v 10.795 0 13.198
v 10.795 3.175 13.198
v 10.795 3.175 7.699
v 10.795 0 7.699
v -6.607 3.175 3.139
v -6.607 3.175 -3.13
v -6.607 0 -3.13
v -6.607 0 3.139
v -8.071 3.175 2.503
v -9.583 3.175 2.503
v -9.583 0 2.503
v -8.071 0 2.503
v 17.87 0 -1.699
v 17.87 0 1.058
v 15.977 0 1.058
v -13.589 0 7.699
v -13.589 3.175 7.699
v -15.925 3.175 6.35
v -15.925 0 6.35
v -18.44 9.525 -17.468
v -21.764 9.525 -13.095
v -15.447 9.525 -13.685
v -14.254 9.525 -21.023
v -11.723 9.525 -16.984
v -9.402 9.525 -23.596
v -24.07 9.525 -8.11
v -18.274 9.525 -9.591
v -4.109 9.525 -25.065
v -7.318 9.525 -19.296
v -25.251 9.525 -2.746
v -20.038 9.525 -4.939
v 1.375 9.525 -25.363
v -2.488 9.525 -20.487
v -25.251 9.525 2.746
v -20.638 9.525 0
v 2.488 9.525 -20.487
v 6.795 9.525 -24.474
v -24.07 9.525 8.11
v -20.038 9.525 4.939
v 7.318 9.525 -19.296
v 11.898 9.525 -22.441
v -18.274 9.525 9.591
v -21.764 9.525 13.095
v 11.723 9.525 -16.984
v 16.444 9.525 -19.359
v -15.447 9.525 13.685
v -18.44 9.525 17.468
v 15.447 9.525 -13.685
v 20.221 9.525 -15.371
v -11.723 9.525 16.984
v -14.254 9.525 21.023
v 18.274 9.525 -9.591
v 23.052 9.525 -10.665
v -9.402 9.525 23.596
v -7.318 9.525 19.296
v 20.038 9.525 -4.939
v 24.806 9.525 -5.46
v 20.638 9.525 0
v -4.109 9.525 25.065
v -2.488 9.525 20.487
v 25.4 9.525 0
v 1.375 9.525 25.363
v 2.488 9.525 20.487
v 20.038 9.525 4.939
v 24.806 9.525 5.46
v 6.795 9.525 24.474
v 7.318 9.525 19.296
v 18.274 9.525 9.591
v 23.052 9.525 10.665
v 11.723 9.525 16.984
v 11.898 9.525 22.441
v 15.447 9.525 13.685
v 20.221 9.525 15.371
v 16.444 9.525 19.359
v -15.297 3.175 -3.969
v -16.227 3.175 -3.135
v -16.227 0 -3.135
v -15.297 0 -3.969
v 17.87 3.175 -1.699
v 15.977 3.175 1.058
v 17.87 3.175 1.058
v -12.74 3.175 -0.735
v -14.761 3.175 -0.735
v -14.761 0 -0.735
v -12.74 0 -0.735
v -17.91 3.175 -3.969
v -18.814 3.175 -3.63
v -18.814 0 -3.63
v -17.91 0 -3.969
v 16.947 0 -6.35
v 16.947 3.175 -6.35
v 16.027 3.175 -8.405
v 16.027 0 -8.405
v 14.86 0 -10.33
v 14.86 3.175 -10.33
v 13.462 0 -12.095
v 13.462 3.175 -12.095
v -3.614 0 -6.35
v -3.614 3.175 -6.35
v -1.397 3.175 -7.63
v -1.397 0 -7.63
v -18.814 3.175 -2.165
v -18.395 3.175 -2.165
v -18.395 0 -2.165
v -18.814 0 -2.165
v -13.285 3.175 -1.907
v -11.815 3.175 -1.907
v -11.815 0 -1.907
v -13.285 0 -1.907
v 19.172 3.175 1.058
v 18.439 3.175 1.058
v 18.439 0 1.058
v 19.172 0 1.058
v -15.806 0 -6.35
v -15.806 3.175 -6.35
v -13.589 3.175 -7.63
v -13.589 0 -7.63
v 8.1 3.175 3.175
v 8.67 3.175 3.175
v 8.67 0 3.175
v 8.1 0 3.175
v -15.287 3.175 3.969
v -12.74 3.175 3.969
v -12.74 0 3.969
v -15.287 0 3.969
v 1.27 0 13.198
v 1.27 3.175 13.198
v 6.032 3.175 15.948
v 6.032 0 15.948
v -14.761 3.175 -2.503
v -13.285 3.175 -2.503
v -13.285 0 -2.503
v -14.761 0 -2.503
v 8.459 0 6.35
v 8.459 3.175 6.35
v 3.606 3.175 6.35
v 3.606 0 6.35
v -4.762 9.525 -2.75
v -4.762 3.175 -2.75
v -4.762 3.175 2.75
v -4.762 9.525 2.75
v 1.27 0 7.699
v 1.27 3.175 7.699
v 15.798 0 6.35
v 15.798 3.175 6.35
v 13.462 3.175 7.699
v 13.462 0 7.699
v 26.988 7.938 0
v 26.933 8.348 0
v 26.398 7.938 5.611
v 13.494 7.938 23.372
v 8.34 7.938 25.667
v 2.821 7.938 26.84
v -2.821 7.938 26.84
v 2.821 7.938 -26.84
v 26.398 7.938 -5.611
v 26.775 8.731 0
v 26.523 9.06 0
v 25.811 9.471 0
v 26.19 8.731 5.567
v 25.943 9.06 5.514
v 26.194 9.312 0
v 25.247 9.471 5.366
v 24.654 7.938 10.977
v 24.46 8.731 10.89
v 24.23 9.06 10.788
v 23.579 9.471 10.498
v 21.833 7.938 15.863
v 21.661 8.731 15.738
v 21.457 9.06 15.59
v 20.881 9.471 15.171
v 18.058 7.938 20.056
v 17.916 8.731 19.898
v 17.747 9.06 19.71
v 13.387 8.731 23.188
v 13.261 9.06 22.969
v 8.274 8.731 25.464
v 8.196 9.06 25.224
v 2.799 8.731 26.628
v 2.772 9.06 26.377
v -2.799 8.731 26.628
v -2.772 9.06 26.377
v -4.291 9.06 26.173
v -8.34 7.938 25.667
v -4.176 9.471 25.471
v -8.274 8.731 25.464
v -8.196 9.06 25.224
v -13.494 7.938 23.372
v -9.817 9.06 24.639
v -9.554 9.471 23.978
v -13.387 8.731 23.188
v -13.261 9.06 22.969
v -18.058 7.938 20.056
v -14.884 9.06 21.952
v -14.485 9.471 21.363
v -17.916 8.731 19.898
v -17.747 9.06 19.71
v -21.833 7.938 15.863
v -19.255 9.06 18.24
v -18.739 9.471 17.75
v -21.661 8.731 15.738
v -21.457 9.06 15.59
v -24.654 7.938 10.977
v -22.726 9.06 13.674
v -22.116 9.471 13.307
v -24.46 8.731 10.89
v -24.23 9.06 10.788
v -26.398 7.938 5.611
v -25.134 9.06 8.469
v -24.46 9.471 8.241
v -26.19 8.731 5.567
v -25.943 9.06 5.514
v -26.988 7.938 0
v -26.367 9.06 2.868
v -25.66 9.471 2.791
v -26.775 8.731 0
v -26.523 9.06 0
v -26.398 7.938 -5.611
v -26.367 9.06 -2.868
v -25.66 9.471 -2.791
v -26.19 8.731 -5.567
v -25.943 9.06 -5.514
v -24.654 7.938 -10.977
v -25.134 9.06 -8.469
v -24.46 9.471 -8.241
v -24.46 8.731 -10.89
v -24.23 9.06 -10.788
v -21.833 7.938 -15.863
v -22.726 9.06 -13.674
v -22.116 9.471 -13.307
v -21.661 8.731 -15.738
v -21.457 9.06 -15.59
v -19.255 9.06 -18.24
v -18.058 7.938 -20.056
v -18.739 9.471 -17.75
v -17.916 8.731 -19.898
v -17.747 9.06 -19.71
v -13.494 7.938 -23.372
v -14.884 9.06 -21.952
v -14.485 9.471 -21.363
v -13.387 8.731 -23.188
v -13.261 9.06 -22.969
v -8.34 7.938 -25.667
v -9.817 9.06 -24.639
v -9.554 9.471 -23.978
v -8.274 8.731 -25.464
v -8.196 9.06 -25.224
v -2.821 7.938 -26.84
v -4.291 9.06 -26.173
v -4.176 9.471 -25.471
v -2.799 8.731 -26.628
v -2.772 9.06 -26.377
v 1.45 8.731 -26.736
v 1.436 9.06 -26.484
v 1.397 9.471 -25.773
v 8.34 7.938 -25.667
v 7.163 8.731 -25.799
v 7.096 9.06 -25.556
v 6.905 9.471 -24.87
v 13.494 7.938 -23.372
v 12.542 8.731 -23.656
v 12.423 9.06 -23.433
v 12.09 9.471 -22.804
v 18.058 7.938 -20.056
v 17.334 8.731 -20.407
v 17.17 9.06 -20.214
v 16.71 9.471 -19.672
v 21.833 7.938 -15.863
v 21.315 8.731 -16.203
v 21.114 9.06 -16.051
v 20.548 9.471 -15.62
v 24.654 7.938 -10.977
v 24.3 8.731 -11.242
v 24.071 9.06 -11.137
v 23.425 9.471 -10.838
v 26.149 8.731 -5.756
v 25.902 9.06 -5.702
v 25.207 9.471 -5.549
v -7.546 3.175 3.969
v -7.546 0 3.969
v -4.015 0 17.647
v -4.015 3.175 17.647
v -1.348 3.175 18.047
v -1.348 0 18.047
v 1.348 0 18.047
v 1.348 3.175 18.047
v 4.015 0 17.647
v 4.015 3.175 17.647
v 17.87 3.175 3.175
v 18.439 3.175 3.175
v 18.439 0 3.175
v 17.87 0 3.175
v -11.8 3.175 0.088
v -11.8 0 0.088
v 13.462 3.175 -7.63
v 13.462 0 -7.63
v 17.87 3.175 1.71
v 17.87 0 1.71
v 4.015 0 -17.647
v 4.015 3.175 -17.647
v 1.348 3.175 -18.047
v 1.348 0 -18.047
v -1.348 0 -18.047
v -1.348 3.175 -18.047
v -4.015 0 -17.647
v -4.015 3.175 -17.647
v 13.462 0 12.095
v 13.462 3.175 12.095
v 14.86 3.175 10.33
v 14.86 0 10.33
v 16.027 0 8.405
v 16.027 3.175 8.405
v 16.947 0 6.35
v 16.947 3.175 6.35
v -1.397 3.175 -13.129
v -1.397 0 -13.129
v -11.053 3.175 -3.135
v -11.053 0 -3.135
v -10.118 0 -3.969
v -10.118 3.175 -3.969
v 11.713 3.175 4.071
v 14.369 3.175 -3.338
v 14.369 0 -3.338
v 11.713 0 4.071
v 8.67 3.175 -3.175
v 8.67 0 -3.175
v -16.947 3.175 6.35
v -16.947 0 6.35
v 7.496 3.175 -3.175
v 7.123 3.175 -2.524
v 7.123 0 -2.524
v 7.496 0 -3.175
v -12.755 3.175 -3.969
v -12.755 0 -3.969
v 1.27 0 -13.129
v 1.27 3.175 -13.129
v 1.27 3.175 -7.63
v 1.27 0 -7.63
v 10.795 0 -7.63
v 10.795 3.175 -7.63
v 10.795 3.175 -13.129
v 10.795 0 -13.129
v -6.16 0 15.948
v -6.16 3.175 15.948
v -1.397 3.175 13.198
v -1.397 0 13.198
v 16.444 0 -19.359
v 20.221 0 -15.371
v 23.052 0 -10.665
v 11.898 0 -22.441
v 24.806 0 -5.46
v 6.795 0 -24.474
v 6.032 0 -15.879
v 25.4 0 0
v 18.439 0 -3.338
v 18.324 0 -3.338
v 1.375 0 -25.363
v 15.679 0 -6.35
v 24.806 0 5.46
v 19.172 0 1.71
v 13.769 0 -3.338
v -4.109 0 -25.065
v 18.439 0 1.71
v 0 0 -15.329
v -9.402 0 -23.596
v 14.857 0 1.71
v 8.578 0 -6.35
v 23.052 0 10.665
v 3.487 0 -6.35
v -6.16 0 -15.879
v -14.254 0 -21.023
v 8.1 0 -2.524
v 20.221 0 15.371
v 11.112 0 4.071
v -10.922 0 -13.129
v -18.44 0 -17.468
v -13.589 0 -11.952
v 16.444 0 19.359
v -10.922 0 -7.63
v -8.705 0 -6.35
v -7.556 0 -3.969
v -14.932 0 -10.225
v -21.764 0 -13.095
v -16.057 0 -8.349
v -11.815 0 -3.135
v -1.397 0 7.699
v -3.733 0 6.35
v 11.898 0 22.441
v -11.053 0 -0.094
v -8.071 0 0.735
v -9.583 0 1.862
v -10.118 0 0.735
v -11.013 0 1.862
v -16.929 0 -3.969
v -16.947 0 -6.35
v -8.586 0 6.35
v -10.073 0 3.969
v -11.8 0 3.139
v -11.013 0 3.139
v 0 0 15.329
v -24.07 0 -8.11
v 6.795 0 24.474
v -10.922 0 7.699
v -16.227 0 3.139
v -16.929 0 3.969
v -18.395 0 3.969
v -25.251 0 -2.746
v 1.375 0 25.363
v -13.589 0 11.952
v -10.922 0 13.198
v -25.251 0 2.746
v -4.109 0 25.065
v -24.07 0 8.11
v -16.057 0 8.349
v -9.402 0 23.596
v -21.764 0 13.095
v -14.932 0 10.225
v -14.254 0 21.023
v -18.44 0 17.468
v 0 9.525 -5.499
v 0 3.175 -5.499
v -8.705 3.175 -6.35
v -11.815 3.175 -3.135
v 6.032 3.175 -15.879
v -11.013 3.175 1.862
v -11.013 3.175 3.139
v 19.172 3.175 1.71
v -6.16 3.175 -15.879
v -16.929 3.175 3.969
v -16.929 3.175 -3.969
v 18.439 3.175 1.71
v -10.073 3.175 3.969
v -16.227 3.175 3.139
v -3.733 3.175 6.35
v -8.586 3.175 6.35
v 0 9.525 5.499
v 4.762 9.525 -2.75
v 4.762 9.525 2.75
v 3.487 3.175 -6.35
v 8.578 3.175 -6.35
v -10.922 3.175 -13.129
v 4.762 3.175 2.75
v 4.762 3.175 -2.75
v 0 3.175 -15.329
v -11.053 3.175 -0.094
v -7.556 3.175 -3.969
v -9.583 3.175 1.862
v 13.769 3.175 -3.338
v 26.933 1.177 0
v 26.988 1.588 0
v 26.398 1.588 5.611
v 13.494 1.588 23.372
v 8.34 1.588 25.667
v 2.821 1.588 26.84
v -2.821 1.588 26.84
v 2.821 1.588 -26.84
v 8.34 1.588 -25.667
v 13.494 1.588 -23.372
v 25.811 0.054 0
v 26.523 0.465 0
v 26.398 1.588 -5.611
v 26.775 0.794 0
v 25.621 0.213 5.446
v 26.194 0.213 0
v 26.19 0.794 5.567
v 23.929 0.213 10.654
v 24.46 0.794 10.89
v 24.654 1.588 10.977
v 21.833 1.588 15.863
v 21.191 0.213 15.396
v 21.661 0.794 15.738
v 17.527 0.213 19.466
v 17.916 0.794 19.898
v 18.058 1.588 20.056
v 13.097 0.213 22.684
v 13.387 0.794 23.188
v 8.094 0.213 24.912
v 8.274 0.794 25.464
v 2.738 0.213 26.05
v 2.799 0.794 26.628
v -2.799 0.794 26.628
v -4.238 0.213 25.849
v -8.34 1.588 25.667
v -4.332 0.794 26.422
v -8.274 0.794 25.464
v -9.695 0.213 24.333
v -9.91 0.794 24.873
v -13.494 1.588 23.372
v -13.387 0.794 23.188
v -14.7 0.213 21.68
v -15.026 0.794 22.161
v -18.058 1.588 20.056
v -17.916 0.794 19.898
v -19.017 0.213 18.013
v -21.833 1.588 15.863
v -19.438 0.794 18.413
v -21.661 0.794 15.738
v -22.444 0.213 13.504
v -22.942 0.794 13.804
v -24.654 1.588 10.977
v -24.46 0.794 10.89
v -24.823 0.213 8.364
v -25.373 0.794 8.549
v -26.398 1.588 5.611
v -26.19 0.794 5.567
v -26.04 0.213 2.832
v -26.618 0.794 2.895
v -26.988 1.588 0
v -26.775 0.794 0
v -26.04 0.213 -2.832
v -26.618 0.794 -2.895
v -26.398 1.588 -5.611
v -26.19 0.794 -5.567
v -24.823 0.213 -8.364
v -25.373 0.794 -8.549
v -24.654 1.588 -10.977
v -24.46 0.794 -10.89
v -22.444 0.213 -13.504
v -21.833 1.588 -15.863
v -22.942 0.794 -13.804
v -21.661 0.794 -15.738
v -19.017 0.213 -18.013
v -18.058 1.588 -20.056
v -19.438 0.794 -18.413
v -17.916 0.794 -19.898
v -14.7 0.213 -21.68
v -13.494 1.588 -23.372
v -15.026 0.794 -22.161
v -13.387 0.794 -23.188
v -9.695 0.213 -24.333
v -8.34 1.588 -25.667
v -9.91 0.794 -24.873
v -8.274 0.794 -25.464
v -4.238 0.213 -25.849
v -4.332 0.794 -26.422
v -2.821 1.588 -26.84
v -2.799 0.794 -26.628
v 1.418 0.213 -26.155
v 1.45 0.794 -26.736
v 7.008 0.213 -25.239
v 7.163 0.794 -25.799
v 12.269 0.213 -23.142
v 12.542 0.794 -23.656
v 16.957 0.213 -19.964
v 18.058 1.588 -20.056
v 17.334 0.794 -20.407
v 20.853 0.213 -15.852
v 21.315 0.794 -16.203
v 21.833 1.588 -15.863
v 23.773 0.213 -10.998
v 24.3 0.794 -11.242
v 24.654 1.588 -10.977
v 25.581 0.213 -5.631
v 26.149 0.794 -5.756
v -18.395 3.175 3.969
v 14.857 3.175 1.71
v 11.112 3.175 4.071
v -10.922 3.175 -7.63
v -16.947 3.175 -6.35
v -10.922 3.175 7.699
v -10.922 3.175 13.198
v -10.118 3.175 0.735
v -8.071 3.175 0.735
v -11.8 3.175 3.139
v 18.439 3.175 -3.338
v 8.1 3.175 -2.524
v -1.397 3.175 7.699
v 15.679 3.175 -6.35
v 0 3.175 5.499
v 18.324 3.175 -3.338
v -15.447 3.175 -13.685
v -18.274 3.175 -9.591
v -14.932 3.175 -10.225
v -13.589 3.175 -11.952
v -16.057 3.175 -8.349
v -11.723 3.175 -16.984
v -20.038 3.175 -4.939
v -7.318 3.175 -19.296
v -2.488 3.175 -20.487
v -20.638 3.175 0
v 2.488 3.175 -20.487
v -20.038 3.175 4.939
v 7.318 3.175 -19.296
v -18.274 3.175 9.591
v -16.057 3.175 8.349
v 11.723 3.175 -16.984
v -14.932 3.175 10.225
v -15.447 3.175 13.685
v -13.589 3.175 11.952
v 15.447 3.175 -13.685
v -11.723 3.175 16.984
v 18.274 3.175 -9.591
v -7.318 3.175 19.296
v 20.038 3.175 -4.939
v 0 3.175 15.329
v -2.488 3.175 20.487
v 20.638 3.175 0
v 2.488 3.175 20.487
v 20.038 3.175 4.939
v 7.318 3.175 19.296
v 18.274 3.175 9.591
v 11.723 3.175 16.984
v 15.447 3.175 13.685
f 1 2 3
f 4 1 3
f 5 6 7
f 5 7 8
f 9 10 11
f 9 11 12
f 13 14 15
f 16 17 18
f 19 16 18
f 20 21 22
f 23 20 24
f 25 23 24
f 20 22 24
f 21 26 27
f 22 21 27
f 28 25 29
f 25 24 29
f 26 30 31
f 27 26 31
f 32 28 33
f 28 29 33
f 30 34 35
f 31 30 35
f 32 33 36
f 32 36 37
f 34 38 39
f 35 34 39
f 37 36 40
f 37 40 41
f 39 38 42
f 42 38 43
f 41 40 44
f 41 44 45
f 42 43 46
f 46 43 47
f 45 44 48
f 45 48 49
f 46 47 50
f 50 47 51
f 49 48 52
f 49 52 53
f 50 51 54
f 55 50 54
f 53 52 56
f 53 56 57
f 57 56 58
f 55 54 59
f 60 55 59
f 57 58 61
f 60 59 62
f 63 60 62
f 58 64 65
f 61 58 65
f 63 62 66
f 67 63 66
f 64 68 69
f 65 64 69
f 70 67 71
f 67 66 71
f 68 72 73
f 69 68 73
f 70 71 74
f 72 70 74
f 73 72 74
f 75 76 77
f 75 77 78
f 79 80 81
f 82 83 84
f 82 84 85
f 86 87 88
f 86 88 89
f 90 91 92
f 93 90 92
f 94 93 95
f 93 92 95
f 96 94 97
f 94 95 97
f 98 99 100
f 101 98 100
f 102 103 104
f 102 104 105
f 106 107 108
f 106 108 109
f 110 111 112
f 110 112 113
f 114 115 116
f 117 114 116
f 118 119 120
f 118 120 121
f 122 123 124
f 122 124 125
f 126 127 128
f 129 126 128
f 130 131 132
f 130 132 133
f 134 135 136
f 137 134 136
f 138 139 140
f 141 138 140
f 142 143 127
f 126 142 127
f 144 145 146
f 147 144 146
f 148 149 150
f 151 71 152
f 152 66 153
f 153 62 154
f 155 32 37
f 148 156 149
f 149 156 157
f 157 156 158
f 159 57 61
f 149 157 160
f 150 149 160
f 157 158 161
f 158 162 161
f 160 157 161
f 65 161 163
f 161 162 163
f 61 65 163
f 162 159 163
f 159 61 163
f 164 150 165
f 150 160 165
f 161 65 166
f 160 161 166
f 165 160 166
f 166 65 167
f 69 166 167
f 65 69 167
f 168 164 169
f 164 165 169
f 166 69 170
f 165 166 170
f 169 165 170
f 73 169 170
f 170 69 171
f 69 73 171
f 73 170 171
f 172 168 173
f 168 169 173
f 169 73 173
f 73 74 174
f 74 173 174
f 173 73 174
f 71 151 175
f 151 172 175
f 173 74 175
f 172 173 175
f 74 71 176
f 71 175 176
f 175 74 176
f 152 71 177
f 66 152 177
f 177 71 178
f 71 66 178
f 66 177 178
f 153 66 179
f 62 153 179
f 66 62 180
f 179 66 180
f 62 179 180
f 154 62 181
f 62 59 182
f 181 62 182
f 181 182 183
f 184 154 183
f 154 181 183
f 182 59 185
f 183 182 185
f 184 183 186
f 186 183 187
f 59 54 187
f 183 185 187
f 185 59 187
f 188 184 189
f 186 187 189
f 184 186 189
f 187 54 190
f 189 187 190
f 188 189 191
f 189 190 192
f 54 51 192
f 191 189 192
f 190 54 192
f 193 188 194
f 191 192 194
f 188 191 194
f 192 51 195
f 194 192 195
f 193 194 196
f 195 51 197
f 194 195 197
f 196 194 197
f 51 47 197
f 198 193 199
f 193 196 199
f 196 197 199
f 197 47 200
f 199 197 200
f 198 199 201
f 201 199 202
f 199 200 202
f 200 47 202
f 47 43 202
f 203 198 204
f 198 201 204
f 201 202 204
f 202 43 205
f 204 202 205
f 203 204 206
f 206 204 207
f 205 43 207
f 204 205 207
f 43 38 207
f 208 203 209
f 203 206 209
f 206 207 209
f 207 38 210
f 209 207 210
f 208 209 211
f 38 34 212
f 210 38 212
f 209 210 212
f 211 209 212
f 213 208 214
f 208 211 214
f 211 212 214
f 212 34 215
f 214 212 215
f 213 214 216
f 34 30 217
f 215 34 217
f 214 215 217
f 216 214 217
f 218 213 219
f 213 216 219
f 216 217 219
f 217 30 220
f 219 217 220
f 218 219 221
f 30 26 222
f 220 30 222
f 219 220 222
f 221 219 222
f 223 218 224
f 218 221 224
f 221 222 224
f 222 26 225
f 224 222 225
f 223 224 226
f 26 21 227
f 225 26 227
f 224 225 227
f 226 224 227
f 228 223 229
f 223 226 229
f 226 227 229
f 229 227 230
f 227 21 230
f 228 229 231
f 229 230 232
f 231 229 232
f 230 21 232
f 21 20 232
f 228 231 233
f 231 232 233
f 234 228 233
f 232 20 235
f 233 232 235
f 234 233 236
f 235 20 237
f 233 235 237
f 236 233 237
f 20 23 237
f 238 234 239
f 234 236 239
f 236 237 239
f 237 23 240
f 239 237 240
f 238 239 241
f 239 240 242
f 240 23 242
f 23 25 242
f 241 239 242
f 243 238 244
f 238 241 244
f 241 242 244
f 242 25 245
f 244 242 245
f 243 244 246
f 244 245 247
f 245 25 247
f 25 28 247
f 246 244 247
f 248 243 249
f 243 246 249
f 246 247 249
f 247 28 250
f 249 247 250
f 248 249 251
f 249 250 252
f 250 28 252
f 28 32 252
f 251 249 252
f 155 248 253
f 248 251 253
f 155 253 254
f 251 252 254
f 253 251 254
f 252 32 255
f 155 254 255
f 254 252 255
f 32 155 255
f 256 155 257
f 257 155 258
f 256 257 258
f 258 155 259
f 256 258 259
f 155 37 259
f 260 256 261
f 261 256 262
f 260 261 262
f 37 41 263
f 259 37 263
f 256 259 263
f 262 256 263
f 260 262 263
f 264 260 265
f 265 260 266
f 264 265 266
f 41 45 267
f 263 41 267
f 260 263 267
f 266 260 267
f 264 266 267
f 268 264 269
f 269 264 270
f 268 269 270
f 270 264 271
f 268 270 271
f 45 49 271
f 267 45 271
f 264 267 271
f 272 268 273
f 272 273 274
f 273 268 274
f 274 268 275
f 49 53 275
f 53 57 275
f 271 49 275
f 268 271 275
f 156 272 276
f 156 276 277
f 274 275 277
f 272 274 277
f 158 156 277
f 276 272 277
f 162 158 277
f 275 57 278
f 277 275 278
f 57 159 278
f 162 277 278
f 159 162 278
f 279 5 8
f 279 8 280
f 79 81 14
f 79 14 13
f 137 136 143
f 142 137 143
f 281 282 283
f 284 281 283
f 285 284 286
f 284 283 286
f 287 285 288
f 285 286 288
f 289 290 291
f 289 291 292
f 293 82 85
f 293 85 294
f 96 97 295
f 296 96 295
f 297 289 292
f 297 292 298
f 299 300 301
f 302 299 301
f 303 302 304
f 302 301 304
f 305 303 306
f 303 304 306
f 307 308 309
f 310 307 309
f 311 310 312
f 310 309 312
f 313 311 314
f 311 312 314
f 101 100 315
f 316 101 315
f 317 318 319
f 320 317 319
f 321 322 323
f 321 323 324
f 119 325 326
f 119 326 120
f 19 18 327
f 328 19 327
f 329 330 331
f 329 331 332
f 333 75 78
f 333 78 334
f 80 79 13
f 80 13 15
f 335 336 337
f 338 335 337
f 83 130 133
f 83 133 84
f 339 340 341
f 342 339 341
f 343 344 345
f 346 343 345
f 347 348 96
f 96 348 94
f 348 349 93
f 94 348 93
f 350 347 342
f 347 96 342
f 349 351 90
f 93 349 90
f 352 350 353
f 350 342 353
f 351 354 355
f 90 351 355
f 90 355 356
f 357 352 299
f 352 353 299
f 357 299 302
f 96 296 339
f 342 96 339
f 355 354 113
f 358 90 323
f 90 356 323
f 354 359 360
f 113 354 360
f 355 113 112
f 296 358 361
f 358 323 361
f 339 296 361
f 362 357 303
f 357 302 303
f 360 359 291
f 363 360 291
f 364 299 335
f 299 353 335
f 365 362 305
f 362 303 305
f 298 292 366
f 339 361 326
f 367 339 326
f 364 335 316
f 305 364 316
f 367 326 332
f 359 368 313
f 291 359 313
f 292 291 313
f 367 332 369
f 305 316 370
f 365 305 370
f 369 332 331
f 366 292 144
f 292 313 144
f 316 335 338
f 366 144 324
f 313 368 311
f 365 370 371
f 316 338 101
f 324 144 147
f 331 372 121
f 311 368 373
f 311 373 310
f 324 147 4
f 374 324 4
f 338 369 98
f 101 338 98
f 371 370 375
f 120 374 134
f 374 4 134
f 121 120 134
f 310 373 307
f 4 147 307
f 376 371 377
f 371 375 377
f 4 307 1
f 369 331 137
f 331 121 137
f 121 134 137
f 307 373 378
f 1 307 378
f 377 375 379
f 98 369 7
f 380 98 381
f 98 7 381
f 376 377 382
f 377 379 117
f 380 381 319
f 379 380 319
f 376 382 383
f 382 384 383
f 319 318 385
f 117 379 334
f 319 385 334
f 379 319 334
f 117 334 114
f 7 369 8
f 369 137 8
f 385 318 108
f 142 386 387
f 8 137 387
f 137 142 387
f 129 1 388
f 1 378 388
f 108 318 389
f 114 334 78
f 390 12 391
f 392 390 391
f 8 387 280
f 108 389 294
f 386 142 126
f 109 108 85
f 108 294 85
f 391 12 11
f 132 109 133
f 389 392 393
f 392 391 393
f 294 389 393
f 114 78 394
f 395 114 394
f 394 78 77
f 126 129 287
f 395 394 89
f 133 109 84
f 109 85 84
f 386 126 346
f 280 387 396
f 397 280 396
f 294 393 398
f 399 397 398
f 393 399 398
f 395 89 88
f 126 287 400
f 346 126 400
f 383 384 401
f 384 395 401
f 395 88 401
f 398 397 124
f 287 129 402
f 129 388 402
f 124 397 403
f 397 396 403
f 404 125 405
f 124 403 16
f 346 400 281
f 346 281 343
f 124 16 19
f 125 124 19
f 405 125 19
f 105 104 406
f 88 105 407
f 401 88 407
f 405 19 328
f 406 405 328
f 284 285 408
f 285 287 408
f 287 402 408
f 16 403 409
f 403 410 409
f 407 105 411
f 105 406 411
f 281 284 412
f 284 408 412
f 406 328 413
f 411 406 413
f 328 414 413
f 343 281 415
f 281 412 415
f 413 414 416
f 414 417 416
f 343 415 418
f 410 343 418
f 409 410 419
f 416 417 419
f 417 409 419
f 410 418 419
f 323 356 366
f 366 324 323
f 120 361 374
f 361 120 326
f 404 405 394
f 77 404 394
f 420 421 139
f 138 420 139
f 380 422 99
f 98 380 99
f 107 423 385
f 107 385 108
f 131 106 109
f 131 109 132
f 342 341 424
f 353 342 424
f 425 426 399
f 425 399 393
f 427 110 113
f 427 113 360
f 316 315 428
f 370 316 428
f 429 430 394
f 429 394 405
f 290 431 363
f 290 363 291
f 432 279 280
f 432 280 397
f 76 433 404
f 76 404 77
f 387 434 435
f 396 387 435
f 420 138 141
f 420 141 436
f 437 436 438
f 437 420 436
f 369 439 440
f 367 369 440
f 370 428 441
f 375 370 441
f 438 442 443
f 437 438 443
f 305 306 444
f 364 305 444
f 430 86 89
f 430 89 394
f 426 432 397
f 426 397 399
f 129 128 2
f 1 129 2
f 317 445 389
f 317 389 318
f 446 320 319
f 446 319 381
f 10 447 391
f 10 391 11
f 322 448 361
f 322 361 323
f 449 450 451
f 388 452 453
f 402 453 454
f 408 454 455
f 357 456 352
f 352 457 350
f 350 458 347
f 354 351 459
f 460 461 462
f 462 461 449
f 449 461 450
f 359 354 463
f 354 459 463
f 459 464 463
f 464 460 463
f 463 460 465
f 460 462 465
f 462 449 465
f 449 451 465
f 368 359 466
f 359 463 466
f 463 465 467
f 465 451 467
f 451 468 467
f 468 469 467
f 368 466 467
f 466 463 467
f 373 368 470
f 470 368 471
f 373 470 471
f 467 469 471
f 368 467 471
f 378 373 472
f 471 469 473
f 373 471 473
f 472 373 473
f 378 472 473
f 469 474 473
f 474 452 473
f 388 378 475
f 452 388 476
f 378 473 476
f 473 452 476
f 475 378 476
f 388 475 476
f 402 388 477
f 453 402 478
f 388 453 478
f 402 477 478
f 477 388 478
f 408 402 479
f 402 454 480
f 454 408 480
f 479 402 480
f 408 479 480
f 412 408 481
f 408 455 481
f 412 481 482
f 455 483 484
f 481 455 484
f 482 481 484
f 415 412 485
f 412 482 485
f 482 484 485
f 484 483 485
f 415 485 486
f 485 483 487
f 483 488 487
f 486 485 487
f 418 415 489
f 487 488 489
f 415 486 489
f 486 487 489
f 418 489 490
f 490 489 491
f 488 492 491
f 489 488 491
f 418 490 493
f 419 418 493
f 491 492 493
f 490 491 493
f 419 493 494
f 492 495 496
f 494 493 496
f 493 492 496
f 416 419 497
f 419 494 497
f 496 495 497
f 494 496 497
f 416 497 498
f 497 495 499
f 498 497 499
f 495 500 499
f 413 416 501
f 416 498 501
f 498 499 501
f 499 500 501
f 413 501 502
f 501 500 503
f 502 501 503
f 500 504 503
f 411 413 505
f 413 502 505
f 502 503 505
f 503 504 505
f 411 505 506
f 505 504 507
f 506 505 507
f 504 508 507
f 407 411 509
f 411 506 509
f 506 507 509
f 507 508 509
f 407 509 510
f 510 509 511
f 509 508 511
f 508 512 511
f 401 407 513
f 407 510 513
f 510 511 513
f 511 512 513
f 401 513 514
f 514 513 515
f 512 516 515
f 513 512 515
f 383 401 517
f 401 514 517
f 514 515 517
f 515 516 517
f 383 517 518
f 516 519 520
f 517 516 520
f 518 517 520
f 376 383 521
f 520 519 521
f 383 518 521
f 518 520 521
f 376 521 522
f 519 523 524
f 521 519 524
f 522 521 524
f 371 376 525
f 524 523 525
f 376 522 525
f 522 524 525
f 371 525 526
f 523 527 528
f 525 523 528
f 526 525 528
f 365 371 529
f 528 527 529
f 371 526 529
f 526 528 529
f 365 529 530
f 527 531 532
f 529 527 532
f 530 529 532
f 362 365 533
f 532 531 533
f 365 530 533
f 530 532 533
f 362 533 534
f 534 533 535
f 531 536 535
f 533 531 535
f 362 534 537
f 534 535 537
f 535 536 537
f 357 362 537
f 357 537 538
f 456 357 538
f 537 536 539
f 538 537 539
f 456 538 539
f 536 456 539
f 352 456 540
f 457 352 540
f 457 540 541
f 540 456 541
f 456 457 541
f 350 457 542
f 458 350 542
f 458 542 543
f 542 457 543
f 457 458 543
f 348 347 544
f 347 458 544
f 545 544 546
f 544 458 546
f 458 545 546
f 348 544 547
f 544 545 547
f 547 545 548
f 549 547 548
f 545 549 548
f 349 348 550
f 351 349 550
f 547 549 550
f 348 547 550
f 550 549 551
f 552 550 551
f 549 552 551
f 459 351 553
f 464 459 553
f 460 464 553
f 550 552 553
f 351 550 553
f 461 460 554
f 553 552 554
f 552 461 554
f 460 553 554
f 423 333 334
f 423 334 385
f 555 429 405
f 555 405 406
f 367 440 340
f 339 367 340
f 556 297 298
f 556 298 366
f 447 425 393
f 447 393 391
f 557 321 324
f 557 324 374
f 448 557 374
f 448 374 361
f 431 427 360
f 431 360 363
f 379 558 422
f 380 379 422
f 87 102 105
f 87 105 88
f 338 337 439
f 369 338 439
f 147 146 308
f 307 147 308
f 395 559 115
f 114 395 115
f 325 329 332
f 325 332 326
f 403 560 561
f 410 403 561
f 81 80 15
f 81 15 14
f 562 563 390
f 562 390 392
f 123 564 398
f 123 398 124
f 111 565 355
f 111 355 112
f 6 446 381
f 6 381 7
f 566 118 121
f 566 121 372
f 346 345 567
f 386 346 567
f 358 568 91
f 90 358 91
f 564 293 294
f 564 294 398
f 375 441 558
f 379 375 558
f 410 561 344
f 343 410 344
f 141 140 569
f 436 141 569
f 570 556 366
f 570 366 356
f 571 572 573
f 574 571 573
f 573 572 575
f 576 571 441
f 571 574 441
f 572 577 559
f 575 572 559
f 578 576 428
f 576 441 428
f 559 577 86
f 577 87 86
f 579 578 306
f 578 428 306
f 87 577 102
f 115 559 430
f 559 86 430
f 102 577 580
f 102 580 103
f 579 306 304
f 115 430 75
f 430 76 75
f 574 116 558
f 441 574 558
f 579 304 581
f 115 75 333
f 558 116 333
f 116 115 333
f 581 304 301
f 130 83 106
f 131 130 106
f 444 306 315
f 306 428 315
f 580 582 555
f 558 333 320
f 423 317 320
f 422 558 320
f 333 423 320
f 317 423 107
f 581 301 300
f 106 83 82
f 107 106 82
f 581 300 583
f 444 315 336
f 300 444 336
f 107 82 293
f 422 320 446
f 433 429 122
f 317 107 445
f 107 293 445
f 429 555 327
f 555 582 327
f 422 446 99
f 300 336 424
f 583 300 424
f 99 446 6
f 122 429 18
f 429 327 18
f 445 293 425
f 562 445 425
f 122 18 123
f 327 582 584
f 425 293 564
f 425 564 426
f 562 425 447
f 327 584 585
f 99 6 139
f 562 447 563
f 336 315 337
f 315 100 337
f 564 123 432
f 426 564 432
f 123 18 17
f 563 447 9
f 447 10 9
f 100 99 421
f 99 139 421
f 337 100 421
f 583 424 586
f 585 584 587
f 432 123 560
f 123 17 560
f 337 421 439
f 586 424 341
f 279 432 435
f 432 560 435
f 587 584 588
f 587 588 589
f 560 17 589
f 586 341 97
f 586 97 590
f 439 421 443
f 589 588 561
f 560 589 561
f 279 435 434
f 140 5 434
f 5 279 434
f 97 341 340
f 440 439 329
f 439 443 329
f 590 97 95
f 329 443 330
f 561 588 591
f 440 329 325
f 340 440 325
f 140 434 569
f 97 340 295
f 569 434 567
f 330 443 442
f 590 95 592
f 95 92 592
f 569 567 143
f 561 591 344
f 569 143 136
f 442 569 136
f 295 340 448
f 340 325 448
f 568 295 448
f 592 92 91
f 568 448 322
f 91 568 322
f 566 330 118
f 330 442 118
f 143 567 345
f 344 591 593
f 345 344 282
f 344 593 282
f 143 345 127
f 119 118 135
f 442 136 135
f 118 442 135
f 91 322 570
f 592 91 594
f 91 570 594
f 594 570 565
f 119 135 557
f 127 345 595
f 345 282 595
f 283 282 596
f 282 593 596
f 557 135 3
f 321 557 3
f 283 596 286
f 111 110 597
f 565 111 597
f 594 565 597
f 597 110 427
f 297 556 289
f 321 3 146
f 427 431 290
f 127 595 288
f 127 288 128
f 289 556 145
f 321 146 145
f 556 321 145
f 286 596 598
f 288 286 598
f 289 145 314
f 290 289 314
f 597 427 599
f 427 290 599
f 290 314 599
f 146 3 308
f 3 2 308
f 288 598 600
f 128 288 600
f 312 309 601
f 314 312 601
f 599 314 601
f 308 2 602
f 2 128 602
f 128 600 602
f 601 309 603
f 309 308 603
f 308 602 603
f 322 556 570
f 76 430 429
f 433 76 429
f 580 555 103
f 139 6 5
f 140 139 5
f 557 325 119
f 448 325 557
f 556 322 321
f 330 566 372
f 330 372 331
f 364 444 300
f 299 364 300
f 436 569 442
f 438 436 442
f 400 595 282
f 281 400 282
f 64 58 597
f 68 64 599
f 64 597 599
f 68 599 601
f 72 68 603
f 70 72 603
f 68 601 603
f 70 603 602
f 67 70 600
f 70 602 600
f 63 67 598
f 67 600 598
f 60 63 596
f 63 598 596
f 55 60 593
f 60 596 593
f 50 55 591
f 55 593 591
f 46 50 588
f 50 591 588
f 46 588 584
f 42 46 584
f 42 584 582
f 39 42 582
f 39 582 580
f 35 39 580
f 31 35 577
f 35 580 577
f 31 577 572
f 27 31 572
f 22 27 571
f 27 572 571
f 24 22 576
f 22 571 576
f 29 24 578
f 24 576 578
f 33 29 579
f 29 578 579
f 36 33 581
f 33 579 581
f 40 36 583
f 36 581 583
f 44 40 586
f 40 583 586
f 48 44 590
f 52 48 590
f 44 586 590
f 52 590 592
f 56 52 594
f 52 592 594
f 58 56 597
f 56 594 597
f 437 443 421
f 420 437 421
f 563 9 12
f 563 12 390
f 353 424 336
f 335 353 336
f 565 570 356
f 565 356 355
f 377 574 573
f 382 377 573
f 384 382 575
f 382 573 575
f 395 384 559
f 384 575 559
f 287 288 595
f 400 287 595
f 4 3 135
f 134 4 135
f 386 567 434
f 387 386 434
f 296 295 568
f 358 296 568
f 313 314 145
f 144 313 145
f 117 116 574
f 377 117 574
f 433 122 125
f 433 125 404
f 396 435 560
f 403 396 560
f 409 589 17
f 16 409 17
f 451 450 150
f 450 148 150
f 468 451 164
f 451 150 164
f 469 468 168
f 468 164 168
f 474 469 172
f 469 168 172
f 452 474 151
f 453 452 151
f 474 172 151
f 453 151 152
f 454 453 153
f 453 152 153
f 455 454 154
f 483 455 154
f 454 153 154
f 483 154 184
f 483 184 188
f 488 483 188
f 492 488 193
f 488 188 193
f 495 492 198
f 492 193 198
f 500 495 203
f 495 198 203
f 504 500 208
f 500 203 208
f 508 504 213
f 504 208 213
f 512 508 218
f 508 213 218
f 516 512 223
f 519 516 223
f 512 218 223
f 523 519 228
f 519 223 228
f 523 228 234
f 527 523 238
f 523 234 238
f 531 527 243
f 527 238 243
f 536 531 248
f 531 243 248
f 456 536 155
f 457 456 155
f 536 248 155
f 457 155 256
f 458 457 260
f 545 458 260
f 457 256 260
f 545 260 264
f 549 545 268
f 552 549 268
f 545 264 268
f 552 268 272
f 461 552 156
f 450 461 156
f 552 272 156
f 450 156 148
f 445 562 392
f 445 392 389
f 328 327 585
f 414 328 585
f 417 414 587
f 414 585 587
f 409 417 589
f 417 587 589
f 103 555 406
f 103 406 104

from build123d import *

# Parameters (mm, degrees)
BOSS_EXTRUDE1_DEPTH     = 6.35
CUT_EXTRUDE1_DEPTH      = 7.35
CUT_EXTRUDE1_DEPTH_BACK = 4.175
CUT_EXTRUDE2_DEPTH      = 7.35
CUT_EXTRUDE2_DEPTH_BACK = 4.175


with BuildPart() as part:
    # Sketch1 → Revolve1 (revolve)
    with BuildSketch(Plane.XY):
        with BuildLine():
            Line((0, 0), (25.4, 0))
            ThreePointArc((25.4, 0), (26.522532015, 0.464967985), (26.9875, 1.5875))
            Line((26.9875, 1.5875), (26.9875, 7.9375))
            ThreePointArc((26.9875, 7.9375), (26.522532015, 9.060032015), (25.4, 9.525))
            Line((25.4, 9.525), (20.6375, 9.525))
            Line((20.6375, 9.525), (20.6375, 3.175))
            Line((20.6375, 3.175), (0, 3.175))
            Line((0, 3.175), (0, 0))
        make_face()
    revolve(axis=Axis((0, 3.175, 0), (0, -1, 0)))

    # Sketch2 → Boss-Extrude1 (add)
    with BuildSketch(Plane(origin=(0, 3.175, 0), x_dir=(1, 0, 0), z_dir=(0, 1, 0))):
        Polygon((0, 5.499261314), (-4.7625, 2.749630657), (-4.7625, -2.749630657), (0, -5.499261314), (4.7625, -2.749630657), (4.7625, 2.749630657), align=None)
    extrude(amount=BOSS_EXTRUDE1_DEPTH)

    # Sketch3 → Cut-Extrude1 (cut, two sides)
    with BuildSketch(Plane(origin=(0, 3.175, 0), x_dir=(1, 0, 0), z_dir=(0, 1, 0))) as cut_extrude1_sk:
        Polygon((-6.60689834, -3.139369578), (-7.545565353, -3.96875), (-10.072630611, -3.96875), (-11.0127947, -3.139369578), (-11.0127947, -1.862363259), (-9.583086571, -1.862363259), (-9.583086571, -2.503112033), (-8.07103923, -2.503112033), (-8.07103923, -0.735064598), (-10.117542908, -0.735064598), (-11.053215768, 0.094315824), (-11.053215768, 3.134878348), (-10.117542908, 3.96875), (-7.556044889, 3.96875), (-6.60689834, 3.130387118), align=None)
        Polygon((-11.800256978, -3.139369578), (-12.740421068, -3.96875), (-15.286948321, -3.96875), (-16.22711241, -3.139369578), (-16.22711241, 3.134878348), (-15.297427857, 3.96875), (-12.755391833, 3.96875), (-11.815227744, 3.134878348), (-11.815227744, 1.907275556), (-13.285356941, 1.907275556), (-13.285356941, 2.503112033), (-14.761474444, 2.503112033), (-14.761474444, 0.735064598), (-12.740421068, 0.735064598), (-11.800256978, -0.088327518), align=None)
        Polygon((-16.929241324, -3.96875), (-18.394879291, -3.96875), (-18.394879291, 2.164772727), (-18.814060732, 2.164772727), (-18.814060732, 3.630410694), (-17.909826481, 3.96875), (-16.929241324, 3.96875), align=None)
        Polygon((7.496103766, 3.175), (8.670192308, 3.175), (8.670192308, -3.175), (8.100320513, -3.175), (8.100320513, 2.523717949), (7.123397436, 2.523717949), align=None)
        Polygon((14.368910256, 3.337820513), (11.712900641, -4.070512821), (11.1125, -4.070512821), (13.768509615, 3.337820513), align=None)
        Polygon((18.323667869, 3.337820513), (18.439423077, 3.337820513), (18.439423077, -1.058333333), (19.172115385, -1.058333333), (19.172115385, -1.709615385), (18.439423077, -1.709615385), (18.439423077, -3.175), (17.869551282, -3.175), (17.869551282, -1.709615385), (14.857371795, -1.709615385), align=None)
        Polygon((17.869551282, -1.058333333), (17.869551282, 1.699439103), (15.976762821, -1.058333333), align=None, mode=Mode.SUBTRACT)
    extrude(amount=CUT_EXTRUDE1_DEPTH, mode=Mode.SUBTRACT)
    extrude(cut_extrude1_sk.sketch, amount=-CUT_EXTRUDE1_DEPTH_BACK, mode=Mode.SUBTRACT)

    # Sketch4 → Cut-Extrude2 (cut, two sides)
    with BuildSketch(Plane(origin=(0, 3.175, 0), x_dir=(1, 0, 0), z_dir=(0, 1, 0))) as cut_extrude2_sk:
        with BuildLine():
            Line((-16.946887804, 6.35), (-15.805631592, 6.35))
            Line((-15.805631592, 6.35), (-13.589, 7.629772846))
            Line((-13.589, 7.629772846), (-13.589, 11.952346433))
            ThreePointArc((-13.589, 11.952346433), (-15.522779467, 9.303914438), (-16.946887804, 6.35))
        make_face()
        Polygon((-8.705368408, 6.35), (-3.613631592, 6.35), (-1.397, 7.629772846), (-1.397, 13.12903416), (-6.1595, 15.878664817), (-10.922, 13.12903416), (-10.922, 7.629772846), align=None)
        with BuildLine():
            ThreePointArc((4.014638475, 17.64659129), (0, 18.0975), (-4.014638475, 17.64659129))
            Line((-4.014638475, 17.64659129), (0, 15.328738686))
            Line((0, 15.328738686), (4.014638475, 17.64659129))
        make_face()
        Polygon((1.27, 7.629772846), (3.486631592, 6.35), (8.578368408, 6.35), (10.795, 7.629772846), (10.795, 13.12903416), (6.0325, 15.878664817), (1.27, 13.12903416), align=None)
        with BuildLine():
            Line((13.462, 7.629772846), (15.678631592, 6.35))
            Line((15.678631592, 6.35), (16.946887804, 6.35))
            ThreePointArc((16.946887804, 6.35), (15.473427829, 9.385762487), (13.462, 12.095208235))
            Line((13.462, 12.095208235), (13.462, 7.629772846))
        make_face()
        Polygon((8.458522628, -6.35), (3.606477372, -6.35), (1.27, -7.69896584), (1.27, -13.198227154), (6.0325, -15.947857811), (10.795, -13.198227154), (10.795, -7.69896584), align=None)
        with BuildLine():
            Line((16.946887804, -6.35), (15.798477372, -6.35))
            Line((15.798477372, -6.35), (13.462, -7.69896584))
            Line((13.462, -7.69896584), (13.462, -12.095208235))
            ThreePointArc((13.462, -12.095208235), (15.473427829, -9.385762487), (16.946887804, -6.35))
        make_face()
        with BuildLine():
            Line((0, -15.328738686), (-4.014638475, -17.64659129))
            ThreePointArc((-4.014638475, -17.64659129), (0, -18.0975), (4.014638475, -17.64659129))
            Line((4.014638475, -17.64659129), (0, -15.328738686))
        make_face()
        Polygon((-1.397, -7.69896584), (-3.733477372, -6.35), (-8.585522628, -6.35), (-10.922, -7.69896584), (-10.922, -13.198227154), (-6.1595, -15.947857811), (-1.397, -13.198227154), align=None)
        with BuildLine():
            Line((-13.589, -7.69896584), (-15.925477372, -6.35))
            Line((-15.925477372, -6.35), (-16.946887804, -6.35))
            ThreePointArc((-16.946887804, -6.35), (-15.522779467, -9.303914438), (-13.589, -11.952346433))
            Line((-13.589, -11.952346433), (-13.589, -7.69896584))
        make_face()
    extrude(amount=CUT_EXTRUDE2_DEPTH, mode=Mode.SUBTRACT)
    extrude(cut_extrude2_sk.sketch, amount=-CUT_EXTRUDE2_DEPTH_BACK, mode=Mode.SUBTRACT)


solid = part.part
